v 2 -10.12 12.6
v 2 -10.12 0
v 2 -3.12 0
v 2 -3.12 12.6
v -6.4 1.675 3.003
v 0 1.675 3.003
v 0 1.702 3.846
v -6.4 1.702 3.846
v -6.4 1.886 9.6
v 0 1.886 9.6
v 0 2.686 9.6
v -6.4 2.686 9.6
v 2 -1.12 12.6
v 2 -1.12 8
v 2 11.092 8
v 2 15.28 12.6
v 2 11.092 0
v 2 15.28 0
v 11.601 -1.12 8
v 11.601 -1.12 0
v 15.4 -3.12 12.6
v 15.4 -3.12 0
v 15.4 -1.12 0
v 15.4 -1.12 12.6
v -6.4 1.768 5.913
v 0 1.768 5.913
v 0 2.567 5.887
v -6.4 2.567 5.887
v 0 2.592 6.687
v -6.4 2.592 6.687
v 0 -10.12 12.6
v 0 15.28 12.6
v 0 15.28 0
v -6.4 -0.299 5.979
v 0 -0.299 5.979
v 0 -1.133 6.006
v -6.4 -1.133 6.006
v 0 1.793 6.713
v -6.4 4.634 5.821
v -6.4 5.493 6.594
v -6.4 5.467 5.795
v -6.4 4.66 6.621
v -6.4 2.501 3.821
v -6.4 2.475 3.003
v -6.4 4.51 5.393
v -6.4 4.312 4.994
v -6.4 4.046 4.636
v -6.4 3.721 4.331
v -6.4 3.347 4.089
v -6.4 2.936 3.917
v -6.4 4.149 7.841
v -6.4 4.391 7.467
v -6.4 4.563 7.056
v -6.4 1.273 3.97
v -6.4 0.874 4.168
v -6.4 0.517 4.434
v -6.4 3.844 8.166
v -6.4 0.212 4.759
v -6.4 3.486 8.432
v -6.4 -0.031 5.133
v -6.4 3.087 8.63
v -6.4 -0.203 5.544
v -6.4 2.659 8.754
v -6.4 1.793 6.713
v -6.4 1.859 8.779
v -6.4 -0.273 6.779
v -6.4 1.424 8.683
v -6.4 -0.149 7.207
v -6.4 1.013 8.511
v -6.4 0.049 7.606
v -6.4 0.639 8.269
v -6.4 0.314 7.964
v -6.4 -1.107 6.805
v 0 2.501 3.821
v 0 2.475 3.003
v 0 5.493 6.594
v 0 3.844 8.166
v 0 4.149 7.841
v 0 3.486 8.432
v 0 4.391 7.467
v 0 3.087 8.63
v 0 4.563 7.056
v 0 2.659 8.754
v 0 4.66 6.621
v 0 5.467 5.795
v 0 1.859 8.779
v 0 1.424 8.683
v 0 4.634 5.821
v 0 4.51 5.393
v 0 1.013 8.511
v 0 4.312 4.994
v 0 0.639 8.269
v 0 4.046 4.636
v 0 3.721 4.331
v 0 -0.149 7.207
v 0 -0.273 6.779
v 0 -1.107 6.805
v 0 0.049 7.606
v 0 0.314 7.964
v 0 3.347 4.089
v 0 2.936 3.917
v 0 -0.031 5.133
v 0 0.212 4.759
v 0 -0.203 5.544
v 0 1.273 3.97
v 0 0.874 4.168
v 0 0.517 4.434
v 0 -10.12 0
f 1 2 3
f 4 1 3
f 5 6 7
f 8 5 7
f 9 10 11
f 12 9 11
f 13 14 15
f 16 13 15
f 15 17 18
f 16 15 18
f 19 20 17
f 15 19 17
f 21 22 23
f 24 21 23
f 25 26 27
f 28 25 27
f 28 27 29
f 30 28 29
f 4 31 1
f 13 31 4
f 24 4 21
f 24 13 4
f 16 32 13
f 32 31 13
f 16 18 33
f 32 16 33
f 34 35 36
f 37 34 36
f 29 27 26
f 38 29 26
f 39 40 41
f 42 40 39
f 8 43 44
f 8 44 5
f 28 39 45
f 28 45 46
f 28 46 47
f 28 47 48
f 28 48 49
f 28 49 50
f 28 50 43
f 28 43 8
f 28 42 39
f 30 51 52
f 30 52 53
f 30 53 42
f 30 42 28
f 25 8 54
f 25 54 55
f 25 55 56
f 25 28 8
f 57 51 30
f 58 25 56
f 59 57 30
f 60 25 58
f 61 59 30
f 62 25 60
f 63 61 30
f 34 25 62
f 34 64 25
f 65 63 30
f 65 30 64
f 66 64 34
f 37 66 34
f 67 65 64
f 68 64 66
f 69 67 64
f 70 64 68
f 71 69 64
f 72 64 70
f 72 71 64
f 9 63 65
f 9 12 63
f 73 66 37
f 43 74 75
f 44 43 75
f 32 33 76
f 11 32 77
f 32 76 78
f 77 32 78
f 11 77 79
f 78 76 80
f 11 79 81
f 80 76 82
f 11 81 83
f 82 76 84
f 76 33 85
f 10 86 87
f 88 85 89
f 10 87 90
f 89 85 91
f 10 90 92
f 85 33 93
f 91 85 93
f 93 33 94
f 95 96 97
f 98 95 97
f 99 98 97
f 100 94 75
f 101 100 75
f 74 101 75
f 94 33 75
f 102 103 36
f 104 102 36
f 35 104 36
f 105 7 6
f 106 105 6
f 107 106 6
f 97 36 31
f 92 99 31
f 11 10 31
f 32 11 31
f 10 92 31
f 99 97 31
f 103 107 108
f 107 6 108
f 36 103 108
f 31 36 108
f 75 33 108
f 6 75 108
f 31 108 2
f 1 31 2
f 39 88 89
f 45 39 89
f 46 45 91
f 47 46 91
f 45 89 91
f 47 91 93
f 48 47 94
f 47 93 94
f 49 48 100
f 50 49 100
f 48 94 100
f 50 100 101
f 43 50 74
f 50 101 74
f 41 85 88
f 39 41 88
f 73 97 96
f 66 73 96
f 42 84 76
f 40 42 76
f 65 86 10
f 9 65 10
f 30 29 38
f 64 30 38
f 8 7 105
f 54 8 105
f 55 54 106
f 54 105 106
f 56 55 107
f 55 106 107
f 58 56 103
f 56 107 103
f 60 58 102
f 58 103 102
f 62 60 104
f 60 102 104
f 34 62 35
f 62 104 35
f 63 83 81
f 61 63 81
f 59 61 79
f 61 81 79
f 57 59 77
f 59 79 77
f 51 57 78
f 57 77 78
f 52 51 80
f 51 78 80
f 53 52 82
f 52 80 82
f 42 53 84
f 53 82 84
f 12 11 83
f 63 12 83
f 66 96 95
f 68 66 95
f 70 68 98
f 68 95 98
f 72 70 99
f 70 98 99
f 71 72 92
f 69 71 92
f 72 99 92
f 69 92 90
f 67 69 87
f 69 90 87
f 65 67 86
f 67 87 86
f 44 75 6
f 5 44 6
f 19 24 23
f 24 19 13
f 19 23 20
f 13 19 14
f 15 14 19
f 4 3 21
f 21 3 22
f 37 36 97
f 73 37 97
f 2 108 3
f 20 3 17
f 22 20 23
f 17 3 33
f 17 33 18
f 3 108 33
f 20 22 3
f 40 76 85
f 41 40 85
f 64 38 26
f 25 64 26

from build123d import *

# Parameters (mm, degrees)
F1_DEPTH = 8
F2_DEPTH = 12.6
F4_DEPTH = 6.4


with BuildPart() as f1:
    # F0 (on Top) → F1 (new body)
    with BuildSketch(Plane.XY):
        Polygon((11.6008939222, -1.1197078275), (2, 11.0917733982), (2, -1.1197078275), align=None)
    extrude(amount=F1_DEPTH)

    # F0 (on Top) → F2 (join)
    with BuildSketch(Plane.XY):
        Polygon((0, 15.2802921725), (0, -10.1197078275), (2, -10.1197078275), (2, -3.1197078275), (15.4, -3.1197078275), (15.4, -1.1197078275), (11.6008939222, -1.1197078275), (2, -1.1197078275), (2, 11.0917733982), (2, 15.2802921725), align=None)
    extrude(amount=F2_DEPTH)

    # F3 (on face) → F4 (join)
    with BuildSketch(Plane(origin=(0, 0, 0), x_dir=(0, -1, 0), z_dir=(-1, 0, 0))):
        with BuildLine():
            ThreePointArc((0.299037522, 5.9791818809), (0.3145348993, 6.1392583384), (0.3197078275, 6.3))
            ThreePointArc((0.3197078275, 6.3), (0.3081127437, 6.5405015024), (0.2734350493, 6.7787720968))
            Line((0.2734350493, 6.7787720968), (-1.7932983009, 6.7125963443))
            Line((-1.7932983009, 6.7125963443), (-1.7676958282, 5.9130061284))
            Line((-1.7676958282, 5.9130061284), (0.299037522, 5.9791818809))
        make_face()
        with BuildLine():
            ThreePointArc((0.2734350493, 6.7787720968), (0.3081127437, 6.5405015024), (0.3197078275, 6.3))
            ThreePointArc((0.3197078275, 6.3), (0.3145348993, 6.1392583384), (0.299037522, 5.9791818809))
            Line((0.299037522, 5.9791818809), (1.1325090638, 6.0058692164))
            Line((1.1325090638, 6.0058692164), (1.1069065911, 6.8054594324))
            Line((1.1069065911, 6.8054594324), (0.2734350493, 6.7787720968))
        make_face()
        with BuildLine():
            Line((-1.7932983009, 6.7125963443), (0.2734350493, 6.7787720968))
            ThreePointArc((0.2734350493, 6.7787720968), (-0.4700047295, 8.123435456), (-1.8594740534, 8.7793296946))
            Line((-1.8594740534, 8.7793296946), (-1.7932983009, 6.7125963443))
        make_face()
        with BuildLine():
            ThreePointArc((-1.7015200757, 3.8462727781), (-0.3568567165, 4.589712557), (0.299037522, 5.9791818809))
            Line((0.299037522, 5.9791818809), (-1.7676958282, 5.9130061284))
            Line((-1.7676958282, 5.9130061284), (-1.7015200757, 3.8462727781))
        make_face()
        with BuildLine():
            Line((-1.7932983009, 6.7125963443), (-1.8594740534, 8.7793296946))
            ThreePointArc((-1.8594740534, 8.7793296946), (-2.2600924425, 8.7987260588), (-2.6586568197, 8.7538066885))
            Line((-2.6586568197, 8.7538066885), (-2.5924789427, 6.687006986))
            Line((-2.5924789427, 6.687006986), (-1.7932983009, 6.7125963443))
        make_face()
        with BuildLine():
            ThreePointArc((-2.6586568197, 8.7538066885), (-2.2600924425, 8.7987260588), (-1.8594740534, 8.7793296946))
            Line((-1.8594740534, 8.7793296946), (-1.8857514999, 9.6))
            Line((-1.8857514999, 9.6), (-2.6857514999, 9.6))
            Line((-2.6857514999, 9.6), (-2.6586568197, 8.7538066885))
        make_face()
        with BuildLine():
            Line((-1.6745311, 3.0033807187), (-1.7015200757, 3.8462727781))
            ThreePointArc((-1.7015200757, 3.8462727781), (-2.1000769886, 3.8012872265), (-2.5006985929, 3.8206170675))
            Line((-2.5006985929, 3.8206170675), (-2.4745311, 3.0033807187))
            Line((-2.4745311, 3.0033807187), (-1.6745311, 3.0033807187))
        make_face()
        with BuildLine():
            ThreePointArc((-2.5006985929, 3.8206170675), (-2.1000769886, 3.8012872265), (-1.7015200757, 3.8462727781))
            Line((-1.7015200757, 3.8462727781), (-1.7676958282, 5.9130061284))
            Line((-1.7676958282, 5.9130061284), (-2.56687647, 5.88741677))
            Line((-2.56687647, 5.88741677), (-2.5006985929, 3.8206170675))
        make_face()
        with BuildLine():
            Line((-2.5924789427, 6.687006986), (-2.6586568197, 8.7538066885))
            ThreePointArc((-2.6586568197, 8.7538066885), (-4.0035856251, 8.0104388285), (-4.6596218671, 6.6208181191))
            Line((-4.6596218671, 6.6208181191), (-2.5924789427, 6.687006986))
        make_face()
        with BuildLine():
            Line((-2.56687647, 5.88741677), (-2.5924789427, 6.687006986))
            Line((-2.5924789427, 6.687006986), (-4.6596218671, 6.6208181191))
            ThreePointArc((-4.6596218671, 6.6208181191), (-4.6790115973, 6.2199922728), (-4.6340193944, 5.8212279032))
            Line((-4.6340193944, 5.8212279032), (-2.56687647, 5.88741677))
        make_face()
        with BuildLine():
            ThreePointArc((-4.6340193944, 5.8212279032), (-3.8904282184, 4.4764225531), (-2.5006985929, 3.8206170675))
            Line((-2.5006985929, 3.8206170675), (-2.56687647, 5.88741677))
            Line((-2.56687647, 5.88741677), (-4.6340193944, 5.8212279032))
        make_face()
        with BuildLine():
            ThreePointArc((-4.6340193944, 5.8212279032), (-4.6790115973, 6.2199922728), (-4.6596218671, 6.6208181191))
            Line((-4.6596218671, 6.6208181191), (-5.4930934089, 6.5941307836))
            Line((-5.4930934089, 6.5941307836), (-5.4674909362, 5.7945405676))
            Line((-5.4674909362, 5.7945405676), (-4.6340193944, 5.8212279032))
        make_face()
    extrude(amount=F4_DEPTH)


solid = f1.part
